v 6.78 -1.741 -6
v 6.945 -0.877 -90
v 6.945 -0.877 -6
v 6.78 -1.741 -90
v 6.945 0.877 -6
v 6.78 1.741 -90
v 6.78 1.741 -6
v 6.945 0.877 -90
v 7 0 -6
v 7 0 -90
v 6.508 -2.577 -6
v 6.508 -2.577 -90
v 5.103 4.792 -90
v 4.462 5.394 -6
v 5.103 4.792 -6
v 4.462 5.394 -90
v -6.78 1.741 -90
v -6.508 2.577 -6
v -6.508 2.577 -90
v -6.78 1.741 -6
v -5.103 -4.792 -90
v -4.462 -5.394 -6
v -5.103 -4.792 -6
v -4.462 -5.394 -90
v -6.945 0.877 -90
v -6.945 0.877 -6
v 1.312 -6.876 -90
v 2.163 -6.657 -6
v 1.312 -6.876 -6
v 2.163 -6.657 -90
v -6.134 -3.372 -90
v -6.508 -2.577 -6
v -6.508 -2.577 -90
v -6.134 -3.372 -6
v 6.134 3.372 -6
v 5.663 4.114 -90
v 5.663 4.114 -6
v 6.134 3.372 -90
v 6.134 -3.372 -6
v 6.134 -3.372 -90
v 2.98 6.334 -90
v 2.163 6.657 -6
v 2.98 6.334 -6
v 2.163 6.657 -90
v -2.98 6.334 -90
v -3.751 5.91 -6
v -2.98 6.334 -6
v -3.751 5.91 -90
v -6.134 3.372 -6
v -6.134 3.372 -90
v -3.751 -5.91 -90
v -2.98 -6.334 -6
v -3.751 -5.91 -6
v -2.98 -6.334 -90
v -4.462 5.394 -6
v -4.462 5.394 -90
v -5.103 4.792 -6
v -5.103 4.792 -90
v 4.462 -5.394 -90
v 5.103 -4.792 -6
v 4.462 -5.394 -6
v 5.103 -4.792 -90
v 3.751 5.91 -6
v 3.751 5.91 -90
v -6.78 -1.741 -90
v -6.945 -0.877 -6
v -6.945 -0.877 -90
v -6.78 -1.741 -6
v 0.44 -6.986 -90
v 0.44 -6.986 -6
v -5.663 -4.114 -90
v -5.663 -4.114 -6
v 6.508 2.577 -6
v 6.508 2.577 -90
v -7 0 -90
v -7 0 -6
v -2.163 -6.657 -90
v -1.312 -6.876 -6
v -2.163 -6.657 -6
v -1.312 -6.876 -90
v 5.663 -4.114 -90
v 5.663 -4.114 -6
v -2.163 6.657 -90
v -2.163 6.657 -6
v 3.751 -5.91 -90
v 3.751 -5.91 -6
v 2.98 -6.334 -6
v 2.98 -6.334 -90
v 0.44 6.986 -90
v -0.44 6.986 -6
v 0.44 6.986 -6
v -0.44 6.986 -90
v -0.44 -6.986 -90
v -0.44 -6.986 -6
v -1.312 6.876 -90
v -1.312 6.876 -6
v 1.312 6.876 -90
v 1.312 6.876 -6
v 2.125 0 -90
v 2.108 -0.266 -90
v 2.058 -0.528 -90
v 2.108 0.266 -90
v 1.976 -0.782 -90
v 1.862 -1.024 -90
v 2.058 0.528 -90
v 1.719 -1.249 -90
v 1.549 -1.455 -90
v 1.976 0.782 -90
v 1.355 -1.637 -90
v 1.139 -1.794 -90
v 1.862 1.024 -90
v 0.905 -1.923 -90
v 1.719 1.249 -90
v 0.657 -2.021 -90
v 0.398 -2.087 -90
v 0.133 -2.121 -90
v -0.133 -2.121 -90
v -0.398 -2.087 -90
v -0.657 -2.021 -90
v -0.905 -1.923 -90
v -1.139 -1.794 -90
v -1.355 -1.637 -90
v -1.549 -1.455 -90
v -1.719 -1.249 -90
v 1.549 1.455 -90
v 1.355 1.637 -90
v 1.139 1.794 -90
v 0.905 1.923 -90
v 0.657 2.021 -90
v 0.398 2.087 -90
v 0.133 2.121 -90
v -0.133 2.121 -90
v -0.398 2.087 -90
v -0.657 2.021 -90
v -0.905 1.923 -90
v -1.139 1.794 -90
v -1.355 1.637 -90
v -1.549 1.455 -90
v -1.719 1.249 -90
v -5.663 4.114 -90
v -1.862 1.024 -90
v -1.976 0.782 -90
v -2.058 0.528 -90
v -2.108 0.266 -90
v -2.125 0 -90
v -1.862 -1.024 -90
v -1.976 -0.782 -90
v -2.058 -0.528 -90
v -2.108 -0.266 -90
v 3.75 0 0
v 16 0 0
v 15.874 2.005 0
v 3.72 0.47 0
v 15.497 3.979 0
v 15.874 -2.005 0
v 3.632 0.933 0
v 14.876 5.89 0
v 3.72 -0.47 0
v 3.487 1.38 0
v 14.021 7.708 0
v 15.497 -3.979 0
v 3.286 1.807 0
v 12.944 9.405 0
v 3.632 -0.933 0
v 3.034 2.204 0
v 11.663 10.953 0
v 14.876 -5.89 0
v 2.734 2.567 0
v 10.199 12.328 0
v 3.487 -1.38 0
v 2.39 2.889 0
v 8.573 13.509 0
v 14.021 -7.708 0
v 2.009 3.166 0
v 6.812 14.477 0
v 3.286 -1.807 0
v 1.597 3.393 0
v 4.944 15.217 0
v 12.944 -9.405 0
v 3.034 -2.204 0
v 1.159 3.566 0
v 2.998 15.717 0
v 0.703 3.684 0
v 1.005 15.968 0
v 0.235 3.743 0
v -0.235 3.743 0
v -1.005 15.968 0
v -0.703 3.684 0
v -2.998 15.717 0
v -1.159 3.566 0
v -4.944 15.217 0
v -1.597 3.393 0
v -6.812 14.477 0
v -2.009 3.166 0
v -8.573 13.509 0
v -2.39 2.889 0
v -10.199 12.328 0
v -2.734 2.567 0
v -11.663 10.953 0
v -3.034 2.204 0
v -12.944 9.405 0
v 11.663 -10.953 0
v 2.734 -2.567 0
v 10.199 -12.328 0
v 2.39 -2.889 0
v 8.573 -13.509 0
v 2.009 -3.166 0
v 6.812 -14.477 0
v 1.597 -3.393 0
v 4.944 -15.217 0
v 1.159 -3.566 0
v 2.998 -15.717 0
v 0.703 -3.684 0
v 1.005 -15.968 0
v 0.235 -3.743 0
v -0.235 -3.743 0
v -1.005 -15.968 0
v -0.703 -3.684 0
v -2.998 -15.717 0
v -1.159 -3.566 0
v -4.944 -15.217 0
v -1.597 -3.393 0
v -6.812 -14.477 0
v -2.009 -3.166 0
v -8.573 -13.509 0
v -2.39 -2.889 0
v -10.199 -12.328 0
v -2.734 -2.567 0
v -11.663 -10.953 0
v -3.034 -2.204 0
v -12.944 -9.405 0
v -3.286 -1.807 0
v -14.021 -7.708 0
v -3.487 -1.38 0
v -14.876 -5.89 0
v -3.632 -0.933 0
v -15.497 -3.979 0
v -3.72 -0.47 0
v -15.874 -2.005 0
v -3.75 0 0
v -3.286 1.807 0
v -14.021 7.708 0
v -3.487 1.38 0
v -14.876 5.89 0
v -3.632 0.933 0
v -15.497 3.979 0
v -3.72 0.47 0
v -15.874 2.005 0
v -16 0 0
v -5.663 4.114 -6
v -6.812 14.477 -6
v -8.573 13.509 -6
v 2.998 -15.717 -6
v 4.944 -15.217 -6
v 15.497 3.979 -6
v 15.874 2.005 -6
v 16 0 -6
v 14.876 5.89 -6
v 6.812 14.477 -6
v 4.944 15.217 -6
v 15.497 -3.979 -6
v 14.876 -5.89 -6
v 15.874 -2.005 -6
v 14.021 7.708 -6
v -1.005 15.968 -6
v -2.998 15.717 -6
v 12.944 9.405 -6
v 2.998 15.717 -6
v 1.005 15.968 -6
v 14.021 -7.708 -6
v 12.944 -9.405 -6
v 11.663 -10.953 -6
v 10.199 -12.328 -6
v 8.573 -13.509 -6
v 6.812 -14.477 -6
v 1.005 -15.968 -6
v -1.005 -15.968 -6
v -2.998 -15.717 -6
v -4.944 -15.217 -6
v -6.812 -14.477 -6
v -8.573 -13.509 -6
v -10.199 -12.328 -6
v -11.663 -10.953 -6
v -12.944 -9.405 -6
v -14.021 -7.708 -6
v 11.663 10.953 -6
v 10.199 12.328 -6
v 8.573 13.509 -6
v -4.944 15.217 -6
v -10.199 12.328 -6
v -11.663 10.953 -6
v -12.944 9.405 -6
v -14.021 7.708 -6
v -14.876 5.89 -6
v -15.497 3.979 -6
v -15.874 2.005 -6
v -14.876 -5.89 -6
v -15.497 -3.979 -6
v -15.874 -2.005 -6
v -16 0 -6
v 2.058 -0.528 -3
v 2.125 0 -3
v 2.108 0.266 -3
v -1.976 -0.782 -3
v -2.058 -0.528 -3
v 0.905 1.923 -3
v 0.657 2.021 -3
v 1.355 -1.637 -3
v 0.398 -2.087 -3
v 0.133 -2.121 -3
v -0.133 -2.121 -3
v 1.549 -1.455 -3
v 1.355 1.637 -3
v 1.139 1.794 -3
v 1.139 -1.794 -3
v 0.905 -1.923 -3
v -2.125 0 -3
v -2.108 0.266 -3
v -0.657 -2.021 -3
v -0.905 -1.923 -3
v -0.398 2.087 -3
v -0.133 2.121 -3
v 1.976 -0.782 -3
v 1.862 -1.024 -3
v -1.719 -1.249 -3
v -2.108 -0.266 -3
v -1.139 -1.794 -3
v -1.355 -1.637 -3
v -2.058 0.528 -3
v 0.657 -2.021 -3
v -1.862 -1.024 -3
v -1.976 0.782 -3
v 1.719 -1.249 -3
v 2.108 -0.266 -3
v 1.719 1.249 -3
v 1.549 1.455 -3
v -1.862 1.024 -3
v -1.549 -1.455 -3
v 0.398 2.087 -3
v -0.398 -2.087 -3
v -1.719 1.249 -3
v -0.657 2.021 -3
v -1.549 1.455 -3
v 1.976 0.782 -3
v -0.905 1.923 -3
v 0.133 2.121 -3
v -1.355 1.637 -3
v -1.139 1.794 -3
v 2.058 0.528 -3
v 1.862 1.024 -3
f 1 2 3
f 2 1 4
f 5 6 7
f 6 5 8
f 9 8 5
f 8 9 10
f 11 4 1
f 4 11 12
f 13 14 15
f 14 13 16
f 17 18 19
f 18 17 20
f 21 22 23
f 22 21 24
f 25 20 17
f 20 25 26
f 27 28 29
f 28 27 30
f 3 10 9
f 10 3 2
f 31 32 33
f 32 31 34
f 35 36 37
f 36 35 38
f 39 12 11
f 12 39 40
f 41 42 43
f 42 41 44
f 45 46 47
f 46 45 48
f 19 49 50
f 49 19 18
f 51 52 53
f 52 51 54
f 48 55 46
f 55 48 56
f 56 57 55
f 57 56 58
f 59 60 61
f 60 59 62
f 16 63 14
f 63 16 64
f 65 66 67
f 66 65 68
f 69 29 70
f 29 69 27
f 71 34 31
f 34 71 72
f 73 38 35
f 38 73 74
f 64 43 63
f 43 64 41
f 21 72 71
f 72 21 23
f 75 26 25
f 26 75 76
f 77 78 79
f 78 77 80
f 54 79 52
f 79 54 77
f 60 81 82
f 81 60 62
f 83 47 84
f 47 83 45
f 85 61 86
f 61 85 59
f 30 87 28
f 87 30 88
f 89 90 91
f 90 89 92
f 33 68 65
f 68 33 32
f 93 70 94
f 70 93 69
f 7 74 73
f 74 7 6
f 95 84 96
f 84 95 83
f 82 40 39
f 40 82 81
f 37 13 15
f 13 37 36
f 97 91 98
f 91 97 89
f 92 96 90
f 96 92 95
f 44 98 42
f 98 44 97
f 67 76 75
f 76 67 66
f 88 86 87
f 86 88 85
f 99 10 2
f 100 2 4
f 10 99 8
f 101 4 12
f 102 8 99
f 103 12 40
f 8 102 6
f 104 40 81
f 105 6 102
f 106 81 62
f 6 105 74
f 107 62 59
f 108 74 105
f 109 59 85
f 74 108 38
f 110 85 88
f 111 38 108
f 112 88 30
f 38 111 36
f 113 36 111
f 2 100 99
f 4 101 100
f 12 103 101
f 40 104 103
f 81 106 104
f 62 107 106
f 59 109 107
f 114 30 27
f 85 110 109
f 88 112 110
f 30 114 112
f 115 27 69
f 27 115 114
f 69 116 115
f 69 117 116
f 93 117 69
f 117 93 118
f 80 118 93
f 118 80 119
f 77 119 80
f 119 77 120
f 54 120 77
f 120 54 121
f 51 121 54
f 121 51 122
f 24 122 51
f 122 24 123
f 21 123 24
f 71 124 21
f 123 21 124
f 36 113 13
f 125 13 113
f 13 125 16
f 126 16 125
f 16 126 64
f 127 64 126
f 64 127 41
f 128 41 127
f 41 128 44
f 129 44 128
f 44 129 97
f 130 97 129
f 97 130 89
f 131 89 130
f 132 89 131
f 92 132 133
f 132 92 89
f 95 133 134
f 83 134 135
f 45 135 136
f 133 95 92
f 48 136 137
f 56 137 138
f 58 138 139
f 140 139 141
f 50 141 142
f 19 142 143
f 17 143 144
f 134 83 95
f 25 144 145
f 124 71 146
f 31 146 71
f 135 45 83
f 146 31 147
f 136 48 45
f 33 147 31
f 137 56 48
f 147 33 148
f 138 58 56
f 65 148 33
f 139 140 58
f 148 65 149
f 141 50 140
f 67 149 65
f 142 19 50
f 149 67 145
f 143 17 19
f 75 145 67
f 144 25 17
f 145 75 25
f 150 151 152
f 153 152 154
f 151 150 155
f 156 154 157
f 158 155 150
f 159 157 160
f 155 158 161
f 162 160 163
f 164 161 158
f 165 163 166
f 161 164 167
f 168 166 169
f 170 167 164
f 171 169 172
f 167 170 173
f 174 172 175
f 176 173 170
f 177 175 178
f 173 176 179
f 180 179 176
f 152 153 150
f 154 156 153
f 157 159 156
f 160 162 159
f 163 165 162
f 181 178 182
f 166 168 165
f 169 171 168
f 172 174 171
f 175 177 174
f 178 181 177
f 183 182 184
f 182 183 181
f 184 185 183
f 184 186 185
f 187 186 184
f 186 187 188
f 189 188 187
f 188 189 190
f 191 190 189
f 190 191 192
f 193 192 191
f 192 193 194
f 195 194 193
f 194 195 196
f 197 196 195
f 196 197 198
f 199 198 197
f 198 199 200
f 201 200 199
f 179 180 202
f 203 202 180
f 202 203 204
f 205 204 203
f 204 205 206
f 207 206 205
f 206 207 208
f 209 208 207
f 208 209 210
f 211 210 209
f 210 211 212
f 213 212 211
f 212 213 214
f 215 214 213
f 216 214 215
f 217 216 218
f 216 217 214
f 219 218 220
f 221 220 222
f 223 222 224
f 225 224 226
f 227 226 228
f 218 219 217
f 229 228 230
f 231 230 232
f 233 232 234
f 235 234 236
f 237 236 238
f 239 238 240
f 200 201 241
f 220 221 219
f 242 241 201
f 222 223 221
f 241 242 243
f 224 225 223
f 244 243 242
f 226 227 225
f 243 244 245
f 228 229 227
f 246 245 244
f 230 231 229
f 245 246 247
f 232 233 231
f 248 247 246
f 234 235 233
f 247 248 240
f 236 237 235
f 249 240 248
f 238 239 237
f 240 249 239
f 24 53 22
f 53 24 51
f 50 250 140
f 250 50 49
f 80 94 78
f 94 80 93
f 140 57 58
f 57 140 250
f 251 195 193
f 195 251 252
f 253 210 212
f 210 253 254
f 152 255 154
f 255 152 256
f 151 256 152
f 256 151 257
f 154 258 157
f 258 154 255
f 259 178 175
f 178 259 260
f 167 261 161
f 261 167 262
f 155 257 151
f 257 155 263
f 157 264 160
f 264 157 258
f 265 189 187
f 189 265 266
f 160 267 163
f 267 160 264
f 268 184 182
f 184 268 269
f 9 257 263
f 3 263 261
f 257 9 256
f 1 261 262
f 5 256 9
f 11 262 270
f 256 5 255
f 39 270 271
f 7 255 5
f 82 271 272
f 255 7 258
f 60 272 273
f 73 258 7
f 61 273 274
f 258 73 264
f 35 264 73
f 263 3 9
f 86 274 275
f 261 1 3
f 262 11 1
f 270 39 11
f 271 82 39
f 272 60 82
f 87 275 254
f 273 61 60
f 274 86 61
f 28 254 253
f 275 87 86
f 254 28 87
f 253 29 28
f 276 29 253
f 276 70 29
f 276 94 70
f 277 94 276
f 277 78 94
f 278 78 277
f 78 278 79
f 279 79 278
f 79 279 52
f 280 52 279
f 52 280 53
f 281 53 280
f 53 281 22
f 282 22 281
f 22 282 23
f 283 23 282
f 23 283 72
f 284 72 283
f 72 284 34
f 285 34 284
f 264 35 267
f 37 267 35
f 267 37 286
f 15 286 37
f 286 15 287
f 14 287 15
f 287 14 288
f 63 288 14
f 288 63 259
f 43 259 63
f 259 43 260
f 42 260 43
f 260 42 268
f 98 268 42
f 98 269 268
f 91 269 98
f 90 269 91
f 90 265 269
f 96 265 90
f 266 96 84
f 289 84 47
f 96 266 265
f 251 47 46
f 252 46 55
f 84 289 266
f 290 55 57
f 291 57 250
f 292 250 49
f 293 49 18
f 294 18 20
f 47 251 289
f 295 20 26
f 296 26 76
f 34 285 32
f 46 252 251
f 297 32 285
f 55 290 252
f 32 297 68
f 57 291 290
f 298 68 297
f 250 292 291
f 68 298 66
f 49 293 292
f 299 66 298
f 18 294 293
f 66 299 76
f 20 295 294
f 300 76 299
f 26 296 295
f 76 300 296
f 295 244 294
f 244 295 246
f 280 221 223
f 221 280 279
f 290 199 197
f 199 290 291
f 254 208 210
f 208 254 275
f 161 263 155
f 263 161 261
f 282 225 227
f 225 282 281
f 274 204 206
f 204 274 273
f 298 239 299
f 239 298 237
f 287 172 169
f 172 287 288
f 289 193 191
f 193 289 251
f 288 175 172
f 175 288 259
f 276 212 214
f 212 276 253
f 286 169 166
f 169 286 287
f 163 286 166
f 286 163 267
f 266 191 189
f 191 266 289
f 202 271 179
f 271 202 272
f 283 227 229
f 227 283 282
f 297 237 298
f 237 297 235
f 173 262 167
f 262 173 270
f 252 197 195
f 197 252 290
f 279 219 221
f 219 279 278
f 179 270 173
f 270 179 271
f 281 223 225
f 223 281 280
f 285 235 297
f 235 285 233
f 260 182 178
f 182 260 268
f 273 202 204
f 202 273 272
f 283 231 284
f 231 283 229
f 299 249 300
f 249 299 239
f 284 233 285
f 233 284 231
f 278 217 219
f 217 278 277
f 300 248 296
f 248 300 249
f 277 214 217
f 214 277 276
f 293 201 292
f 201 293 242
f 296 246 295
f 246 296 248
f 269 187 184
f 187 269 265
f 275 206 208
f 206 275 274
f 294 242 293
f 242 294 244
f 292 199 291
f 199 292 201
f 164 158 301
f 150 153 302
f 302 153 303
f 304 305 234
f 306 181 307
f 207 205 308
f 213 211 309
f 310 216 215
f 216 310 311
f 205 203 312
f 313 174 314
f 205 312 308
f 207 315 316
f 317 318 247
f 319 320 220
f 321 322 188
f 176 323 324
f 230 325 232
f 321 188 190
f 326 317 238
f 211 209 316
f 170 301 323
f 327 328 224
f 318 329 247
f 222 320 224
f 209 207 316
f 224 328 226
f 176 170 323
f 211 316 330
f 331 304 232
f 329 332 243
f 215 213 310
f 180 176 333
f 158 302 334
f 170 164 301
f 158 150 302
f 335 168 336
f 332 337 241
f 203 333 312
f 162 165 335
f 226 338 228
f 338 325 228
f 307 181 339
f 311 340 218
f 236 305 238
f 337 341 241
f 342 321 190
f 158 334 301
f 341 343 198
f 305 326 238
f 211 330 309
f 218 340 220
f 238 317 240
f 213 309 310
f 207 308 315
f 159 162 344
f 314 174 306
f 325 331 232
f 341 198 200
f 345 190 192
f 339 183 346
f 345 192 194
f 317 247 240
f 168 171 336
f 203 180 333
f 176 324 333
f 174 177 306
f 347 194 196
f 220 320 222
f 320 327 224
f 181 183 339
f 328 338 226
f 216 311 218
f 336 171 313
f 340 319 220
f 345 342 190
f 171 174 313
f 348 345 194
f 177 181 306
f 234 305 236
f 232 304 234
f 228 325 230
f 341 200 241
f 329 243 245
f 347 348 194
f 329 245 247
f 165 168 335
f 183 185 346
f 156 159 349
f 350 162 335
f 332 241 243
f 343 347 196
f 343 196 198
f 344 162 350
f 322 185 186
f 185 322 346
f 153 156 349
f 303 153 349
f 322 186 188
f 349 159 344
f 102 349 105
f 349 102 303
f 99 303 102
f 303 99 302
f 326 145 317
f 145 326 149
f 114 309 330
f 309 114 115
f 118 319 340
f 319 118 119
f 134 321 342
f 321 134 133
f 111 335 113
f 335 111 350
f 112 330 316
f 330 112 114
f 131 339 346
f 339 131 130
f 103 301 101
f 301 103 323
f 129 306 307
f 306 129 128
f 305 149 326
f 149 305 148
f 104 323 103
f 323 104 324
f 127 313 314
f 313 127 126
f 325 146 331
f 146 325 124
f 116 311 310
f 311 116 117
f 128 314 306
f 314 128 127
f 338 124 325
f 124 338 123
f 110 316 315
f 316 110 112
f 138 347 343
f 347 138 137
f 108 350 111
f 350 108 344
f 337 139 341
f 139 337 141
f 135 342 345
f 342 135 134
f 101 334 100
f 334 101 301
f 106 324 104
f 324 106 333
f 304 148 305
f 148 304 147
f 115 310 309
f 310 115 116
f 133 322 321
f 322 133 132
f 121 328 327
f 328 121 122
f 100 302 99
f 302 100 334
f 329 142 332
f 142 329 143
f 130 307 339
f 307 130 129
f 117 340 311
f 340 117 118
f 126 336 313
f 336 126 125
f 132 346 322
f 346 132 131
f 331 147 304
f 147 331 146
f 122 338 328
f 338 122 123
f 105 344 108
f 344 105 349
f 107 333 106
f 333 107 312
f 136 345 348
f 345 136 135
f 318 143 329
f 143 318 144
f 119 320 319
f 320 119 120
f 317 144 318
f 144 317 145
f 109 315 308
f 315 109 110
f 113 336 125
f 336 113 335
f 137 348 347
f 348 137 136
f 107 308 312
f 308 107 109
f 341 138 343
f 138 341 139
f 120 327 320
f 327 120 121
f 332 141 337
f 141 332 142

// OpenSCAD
$fn = 50;


difference() {
	union() {
		translate(v = [0, 0, -90.0000000000]) {
			cylinder(h = 90, r = 7.0000000000);
		}
		translate(v = [0, 0, -6.0000000000]) {
			cylinder(h = 6, r = 16.0000000000);
		}
	}
	union() {
		translate(v = [0, 0, 0]) {
			rotate(a = [0, 0, 0]) {
				difference() {
					union() {
						#translate(v = [0, 0, -90.0000000000]) {
							cylinder(h = 90, r = 2.0000000000);
						}
						#translate(v = [0, 0, -3]) {
							cylinder(h = 3, r1 = 2.1250000000, r2 = 3.7500000000);
						}
						#translate(v = [0, 0, -90.0000000000]) {
							cylinder(h = 90, r = 2.1250000000);
						}
						#translate(v = [0, 0, -90.0000000000]) {
							cylinder(h = 90, r = 2.0000000000);
						}
					}
					union();
				}
			}
		}
	}
}
